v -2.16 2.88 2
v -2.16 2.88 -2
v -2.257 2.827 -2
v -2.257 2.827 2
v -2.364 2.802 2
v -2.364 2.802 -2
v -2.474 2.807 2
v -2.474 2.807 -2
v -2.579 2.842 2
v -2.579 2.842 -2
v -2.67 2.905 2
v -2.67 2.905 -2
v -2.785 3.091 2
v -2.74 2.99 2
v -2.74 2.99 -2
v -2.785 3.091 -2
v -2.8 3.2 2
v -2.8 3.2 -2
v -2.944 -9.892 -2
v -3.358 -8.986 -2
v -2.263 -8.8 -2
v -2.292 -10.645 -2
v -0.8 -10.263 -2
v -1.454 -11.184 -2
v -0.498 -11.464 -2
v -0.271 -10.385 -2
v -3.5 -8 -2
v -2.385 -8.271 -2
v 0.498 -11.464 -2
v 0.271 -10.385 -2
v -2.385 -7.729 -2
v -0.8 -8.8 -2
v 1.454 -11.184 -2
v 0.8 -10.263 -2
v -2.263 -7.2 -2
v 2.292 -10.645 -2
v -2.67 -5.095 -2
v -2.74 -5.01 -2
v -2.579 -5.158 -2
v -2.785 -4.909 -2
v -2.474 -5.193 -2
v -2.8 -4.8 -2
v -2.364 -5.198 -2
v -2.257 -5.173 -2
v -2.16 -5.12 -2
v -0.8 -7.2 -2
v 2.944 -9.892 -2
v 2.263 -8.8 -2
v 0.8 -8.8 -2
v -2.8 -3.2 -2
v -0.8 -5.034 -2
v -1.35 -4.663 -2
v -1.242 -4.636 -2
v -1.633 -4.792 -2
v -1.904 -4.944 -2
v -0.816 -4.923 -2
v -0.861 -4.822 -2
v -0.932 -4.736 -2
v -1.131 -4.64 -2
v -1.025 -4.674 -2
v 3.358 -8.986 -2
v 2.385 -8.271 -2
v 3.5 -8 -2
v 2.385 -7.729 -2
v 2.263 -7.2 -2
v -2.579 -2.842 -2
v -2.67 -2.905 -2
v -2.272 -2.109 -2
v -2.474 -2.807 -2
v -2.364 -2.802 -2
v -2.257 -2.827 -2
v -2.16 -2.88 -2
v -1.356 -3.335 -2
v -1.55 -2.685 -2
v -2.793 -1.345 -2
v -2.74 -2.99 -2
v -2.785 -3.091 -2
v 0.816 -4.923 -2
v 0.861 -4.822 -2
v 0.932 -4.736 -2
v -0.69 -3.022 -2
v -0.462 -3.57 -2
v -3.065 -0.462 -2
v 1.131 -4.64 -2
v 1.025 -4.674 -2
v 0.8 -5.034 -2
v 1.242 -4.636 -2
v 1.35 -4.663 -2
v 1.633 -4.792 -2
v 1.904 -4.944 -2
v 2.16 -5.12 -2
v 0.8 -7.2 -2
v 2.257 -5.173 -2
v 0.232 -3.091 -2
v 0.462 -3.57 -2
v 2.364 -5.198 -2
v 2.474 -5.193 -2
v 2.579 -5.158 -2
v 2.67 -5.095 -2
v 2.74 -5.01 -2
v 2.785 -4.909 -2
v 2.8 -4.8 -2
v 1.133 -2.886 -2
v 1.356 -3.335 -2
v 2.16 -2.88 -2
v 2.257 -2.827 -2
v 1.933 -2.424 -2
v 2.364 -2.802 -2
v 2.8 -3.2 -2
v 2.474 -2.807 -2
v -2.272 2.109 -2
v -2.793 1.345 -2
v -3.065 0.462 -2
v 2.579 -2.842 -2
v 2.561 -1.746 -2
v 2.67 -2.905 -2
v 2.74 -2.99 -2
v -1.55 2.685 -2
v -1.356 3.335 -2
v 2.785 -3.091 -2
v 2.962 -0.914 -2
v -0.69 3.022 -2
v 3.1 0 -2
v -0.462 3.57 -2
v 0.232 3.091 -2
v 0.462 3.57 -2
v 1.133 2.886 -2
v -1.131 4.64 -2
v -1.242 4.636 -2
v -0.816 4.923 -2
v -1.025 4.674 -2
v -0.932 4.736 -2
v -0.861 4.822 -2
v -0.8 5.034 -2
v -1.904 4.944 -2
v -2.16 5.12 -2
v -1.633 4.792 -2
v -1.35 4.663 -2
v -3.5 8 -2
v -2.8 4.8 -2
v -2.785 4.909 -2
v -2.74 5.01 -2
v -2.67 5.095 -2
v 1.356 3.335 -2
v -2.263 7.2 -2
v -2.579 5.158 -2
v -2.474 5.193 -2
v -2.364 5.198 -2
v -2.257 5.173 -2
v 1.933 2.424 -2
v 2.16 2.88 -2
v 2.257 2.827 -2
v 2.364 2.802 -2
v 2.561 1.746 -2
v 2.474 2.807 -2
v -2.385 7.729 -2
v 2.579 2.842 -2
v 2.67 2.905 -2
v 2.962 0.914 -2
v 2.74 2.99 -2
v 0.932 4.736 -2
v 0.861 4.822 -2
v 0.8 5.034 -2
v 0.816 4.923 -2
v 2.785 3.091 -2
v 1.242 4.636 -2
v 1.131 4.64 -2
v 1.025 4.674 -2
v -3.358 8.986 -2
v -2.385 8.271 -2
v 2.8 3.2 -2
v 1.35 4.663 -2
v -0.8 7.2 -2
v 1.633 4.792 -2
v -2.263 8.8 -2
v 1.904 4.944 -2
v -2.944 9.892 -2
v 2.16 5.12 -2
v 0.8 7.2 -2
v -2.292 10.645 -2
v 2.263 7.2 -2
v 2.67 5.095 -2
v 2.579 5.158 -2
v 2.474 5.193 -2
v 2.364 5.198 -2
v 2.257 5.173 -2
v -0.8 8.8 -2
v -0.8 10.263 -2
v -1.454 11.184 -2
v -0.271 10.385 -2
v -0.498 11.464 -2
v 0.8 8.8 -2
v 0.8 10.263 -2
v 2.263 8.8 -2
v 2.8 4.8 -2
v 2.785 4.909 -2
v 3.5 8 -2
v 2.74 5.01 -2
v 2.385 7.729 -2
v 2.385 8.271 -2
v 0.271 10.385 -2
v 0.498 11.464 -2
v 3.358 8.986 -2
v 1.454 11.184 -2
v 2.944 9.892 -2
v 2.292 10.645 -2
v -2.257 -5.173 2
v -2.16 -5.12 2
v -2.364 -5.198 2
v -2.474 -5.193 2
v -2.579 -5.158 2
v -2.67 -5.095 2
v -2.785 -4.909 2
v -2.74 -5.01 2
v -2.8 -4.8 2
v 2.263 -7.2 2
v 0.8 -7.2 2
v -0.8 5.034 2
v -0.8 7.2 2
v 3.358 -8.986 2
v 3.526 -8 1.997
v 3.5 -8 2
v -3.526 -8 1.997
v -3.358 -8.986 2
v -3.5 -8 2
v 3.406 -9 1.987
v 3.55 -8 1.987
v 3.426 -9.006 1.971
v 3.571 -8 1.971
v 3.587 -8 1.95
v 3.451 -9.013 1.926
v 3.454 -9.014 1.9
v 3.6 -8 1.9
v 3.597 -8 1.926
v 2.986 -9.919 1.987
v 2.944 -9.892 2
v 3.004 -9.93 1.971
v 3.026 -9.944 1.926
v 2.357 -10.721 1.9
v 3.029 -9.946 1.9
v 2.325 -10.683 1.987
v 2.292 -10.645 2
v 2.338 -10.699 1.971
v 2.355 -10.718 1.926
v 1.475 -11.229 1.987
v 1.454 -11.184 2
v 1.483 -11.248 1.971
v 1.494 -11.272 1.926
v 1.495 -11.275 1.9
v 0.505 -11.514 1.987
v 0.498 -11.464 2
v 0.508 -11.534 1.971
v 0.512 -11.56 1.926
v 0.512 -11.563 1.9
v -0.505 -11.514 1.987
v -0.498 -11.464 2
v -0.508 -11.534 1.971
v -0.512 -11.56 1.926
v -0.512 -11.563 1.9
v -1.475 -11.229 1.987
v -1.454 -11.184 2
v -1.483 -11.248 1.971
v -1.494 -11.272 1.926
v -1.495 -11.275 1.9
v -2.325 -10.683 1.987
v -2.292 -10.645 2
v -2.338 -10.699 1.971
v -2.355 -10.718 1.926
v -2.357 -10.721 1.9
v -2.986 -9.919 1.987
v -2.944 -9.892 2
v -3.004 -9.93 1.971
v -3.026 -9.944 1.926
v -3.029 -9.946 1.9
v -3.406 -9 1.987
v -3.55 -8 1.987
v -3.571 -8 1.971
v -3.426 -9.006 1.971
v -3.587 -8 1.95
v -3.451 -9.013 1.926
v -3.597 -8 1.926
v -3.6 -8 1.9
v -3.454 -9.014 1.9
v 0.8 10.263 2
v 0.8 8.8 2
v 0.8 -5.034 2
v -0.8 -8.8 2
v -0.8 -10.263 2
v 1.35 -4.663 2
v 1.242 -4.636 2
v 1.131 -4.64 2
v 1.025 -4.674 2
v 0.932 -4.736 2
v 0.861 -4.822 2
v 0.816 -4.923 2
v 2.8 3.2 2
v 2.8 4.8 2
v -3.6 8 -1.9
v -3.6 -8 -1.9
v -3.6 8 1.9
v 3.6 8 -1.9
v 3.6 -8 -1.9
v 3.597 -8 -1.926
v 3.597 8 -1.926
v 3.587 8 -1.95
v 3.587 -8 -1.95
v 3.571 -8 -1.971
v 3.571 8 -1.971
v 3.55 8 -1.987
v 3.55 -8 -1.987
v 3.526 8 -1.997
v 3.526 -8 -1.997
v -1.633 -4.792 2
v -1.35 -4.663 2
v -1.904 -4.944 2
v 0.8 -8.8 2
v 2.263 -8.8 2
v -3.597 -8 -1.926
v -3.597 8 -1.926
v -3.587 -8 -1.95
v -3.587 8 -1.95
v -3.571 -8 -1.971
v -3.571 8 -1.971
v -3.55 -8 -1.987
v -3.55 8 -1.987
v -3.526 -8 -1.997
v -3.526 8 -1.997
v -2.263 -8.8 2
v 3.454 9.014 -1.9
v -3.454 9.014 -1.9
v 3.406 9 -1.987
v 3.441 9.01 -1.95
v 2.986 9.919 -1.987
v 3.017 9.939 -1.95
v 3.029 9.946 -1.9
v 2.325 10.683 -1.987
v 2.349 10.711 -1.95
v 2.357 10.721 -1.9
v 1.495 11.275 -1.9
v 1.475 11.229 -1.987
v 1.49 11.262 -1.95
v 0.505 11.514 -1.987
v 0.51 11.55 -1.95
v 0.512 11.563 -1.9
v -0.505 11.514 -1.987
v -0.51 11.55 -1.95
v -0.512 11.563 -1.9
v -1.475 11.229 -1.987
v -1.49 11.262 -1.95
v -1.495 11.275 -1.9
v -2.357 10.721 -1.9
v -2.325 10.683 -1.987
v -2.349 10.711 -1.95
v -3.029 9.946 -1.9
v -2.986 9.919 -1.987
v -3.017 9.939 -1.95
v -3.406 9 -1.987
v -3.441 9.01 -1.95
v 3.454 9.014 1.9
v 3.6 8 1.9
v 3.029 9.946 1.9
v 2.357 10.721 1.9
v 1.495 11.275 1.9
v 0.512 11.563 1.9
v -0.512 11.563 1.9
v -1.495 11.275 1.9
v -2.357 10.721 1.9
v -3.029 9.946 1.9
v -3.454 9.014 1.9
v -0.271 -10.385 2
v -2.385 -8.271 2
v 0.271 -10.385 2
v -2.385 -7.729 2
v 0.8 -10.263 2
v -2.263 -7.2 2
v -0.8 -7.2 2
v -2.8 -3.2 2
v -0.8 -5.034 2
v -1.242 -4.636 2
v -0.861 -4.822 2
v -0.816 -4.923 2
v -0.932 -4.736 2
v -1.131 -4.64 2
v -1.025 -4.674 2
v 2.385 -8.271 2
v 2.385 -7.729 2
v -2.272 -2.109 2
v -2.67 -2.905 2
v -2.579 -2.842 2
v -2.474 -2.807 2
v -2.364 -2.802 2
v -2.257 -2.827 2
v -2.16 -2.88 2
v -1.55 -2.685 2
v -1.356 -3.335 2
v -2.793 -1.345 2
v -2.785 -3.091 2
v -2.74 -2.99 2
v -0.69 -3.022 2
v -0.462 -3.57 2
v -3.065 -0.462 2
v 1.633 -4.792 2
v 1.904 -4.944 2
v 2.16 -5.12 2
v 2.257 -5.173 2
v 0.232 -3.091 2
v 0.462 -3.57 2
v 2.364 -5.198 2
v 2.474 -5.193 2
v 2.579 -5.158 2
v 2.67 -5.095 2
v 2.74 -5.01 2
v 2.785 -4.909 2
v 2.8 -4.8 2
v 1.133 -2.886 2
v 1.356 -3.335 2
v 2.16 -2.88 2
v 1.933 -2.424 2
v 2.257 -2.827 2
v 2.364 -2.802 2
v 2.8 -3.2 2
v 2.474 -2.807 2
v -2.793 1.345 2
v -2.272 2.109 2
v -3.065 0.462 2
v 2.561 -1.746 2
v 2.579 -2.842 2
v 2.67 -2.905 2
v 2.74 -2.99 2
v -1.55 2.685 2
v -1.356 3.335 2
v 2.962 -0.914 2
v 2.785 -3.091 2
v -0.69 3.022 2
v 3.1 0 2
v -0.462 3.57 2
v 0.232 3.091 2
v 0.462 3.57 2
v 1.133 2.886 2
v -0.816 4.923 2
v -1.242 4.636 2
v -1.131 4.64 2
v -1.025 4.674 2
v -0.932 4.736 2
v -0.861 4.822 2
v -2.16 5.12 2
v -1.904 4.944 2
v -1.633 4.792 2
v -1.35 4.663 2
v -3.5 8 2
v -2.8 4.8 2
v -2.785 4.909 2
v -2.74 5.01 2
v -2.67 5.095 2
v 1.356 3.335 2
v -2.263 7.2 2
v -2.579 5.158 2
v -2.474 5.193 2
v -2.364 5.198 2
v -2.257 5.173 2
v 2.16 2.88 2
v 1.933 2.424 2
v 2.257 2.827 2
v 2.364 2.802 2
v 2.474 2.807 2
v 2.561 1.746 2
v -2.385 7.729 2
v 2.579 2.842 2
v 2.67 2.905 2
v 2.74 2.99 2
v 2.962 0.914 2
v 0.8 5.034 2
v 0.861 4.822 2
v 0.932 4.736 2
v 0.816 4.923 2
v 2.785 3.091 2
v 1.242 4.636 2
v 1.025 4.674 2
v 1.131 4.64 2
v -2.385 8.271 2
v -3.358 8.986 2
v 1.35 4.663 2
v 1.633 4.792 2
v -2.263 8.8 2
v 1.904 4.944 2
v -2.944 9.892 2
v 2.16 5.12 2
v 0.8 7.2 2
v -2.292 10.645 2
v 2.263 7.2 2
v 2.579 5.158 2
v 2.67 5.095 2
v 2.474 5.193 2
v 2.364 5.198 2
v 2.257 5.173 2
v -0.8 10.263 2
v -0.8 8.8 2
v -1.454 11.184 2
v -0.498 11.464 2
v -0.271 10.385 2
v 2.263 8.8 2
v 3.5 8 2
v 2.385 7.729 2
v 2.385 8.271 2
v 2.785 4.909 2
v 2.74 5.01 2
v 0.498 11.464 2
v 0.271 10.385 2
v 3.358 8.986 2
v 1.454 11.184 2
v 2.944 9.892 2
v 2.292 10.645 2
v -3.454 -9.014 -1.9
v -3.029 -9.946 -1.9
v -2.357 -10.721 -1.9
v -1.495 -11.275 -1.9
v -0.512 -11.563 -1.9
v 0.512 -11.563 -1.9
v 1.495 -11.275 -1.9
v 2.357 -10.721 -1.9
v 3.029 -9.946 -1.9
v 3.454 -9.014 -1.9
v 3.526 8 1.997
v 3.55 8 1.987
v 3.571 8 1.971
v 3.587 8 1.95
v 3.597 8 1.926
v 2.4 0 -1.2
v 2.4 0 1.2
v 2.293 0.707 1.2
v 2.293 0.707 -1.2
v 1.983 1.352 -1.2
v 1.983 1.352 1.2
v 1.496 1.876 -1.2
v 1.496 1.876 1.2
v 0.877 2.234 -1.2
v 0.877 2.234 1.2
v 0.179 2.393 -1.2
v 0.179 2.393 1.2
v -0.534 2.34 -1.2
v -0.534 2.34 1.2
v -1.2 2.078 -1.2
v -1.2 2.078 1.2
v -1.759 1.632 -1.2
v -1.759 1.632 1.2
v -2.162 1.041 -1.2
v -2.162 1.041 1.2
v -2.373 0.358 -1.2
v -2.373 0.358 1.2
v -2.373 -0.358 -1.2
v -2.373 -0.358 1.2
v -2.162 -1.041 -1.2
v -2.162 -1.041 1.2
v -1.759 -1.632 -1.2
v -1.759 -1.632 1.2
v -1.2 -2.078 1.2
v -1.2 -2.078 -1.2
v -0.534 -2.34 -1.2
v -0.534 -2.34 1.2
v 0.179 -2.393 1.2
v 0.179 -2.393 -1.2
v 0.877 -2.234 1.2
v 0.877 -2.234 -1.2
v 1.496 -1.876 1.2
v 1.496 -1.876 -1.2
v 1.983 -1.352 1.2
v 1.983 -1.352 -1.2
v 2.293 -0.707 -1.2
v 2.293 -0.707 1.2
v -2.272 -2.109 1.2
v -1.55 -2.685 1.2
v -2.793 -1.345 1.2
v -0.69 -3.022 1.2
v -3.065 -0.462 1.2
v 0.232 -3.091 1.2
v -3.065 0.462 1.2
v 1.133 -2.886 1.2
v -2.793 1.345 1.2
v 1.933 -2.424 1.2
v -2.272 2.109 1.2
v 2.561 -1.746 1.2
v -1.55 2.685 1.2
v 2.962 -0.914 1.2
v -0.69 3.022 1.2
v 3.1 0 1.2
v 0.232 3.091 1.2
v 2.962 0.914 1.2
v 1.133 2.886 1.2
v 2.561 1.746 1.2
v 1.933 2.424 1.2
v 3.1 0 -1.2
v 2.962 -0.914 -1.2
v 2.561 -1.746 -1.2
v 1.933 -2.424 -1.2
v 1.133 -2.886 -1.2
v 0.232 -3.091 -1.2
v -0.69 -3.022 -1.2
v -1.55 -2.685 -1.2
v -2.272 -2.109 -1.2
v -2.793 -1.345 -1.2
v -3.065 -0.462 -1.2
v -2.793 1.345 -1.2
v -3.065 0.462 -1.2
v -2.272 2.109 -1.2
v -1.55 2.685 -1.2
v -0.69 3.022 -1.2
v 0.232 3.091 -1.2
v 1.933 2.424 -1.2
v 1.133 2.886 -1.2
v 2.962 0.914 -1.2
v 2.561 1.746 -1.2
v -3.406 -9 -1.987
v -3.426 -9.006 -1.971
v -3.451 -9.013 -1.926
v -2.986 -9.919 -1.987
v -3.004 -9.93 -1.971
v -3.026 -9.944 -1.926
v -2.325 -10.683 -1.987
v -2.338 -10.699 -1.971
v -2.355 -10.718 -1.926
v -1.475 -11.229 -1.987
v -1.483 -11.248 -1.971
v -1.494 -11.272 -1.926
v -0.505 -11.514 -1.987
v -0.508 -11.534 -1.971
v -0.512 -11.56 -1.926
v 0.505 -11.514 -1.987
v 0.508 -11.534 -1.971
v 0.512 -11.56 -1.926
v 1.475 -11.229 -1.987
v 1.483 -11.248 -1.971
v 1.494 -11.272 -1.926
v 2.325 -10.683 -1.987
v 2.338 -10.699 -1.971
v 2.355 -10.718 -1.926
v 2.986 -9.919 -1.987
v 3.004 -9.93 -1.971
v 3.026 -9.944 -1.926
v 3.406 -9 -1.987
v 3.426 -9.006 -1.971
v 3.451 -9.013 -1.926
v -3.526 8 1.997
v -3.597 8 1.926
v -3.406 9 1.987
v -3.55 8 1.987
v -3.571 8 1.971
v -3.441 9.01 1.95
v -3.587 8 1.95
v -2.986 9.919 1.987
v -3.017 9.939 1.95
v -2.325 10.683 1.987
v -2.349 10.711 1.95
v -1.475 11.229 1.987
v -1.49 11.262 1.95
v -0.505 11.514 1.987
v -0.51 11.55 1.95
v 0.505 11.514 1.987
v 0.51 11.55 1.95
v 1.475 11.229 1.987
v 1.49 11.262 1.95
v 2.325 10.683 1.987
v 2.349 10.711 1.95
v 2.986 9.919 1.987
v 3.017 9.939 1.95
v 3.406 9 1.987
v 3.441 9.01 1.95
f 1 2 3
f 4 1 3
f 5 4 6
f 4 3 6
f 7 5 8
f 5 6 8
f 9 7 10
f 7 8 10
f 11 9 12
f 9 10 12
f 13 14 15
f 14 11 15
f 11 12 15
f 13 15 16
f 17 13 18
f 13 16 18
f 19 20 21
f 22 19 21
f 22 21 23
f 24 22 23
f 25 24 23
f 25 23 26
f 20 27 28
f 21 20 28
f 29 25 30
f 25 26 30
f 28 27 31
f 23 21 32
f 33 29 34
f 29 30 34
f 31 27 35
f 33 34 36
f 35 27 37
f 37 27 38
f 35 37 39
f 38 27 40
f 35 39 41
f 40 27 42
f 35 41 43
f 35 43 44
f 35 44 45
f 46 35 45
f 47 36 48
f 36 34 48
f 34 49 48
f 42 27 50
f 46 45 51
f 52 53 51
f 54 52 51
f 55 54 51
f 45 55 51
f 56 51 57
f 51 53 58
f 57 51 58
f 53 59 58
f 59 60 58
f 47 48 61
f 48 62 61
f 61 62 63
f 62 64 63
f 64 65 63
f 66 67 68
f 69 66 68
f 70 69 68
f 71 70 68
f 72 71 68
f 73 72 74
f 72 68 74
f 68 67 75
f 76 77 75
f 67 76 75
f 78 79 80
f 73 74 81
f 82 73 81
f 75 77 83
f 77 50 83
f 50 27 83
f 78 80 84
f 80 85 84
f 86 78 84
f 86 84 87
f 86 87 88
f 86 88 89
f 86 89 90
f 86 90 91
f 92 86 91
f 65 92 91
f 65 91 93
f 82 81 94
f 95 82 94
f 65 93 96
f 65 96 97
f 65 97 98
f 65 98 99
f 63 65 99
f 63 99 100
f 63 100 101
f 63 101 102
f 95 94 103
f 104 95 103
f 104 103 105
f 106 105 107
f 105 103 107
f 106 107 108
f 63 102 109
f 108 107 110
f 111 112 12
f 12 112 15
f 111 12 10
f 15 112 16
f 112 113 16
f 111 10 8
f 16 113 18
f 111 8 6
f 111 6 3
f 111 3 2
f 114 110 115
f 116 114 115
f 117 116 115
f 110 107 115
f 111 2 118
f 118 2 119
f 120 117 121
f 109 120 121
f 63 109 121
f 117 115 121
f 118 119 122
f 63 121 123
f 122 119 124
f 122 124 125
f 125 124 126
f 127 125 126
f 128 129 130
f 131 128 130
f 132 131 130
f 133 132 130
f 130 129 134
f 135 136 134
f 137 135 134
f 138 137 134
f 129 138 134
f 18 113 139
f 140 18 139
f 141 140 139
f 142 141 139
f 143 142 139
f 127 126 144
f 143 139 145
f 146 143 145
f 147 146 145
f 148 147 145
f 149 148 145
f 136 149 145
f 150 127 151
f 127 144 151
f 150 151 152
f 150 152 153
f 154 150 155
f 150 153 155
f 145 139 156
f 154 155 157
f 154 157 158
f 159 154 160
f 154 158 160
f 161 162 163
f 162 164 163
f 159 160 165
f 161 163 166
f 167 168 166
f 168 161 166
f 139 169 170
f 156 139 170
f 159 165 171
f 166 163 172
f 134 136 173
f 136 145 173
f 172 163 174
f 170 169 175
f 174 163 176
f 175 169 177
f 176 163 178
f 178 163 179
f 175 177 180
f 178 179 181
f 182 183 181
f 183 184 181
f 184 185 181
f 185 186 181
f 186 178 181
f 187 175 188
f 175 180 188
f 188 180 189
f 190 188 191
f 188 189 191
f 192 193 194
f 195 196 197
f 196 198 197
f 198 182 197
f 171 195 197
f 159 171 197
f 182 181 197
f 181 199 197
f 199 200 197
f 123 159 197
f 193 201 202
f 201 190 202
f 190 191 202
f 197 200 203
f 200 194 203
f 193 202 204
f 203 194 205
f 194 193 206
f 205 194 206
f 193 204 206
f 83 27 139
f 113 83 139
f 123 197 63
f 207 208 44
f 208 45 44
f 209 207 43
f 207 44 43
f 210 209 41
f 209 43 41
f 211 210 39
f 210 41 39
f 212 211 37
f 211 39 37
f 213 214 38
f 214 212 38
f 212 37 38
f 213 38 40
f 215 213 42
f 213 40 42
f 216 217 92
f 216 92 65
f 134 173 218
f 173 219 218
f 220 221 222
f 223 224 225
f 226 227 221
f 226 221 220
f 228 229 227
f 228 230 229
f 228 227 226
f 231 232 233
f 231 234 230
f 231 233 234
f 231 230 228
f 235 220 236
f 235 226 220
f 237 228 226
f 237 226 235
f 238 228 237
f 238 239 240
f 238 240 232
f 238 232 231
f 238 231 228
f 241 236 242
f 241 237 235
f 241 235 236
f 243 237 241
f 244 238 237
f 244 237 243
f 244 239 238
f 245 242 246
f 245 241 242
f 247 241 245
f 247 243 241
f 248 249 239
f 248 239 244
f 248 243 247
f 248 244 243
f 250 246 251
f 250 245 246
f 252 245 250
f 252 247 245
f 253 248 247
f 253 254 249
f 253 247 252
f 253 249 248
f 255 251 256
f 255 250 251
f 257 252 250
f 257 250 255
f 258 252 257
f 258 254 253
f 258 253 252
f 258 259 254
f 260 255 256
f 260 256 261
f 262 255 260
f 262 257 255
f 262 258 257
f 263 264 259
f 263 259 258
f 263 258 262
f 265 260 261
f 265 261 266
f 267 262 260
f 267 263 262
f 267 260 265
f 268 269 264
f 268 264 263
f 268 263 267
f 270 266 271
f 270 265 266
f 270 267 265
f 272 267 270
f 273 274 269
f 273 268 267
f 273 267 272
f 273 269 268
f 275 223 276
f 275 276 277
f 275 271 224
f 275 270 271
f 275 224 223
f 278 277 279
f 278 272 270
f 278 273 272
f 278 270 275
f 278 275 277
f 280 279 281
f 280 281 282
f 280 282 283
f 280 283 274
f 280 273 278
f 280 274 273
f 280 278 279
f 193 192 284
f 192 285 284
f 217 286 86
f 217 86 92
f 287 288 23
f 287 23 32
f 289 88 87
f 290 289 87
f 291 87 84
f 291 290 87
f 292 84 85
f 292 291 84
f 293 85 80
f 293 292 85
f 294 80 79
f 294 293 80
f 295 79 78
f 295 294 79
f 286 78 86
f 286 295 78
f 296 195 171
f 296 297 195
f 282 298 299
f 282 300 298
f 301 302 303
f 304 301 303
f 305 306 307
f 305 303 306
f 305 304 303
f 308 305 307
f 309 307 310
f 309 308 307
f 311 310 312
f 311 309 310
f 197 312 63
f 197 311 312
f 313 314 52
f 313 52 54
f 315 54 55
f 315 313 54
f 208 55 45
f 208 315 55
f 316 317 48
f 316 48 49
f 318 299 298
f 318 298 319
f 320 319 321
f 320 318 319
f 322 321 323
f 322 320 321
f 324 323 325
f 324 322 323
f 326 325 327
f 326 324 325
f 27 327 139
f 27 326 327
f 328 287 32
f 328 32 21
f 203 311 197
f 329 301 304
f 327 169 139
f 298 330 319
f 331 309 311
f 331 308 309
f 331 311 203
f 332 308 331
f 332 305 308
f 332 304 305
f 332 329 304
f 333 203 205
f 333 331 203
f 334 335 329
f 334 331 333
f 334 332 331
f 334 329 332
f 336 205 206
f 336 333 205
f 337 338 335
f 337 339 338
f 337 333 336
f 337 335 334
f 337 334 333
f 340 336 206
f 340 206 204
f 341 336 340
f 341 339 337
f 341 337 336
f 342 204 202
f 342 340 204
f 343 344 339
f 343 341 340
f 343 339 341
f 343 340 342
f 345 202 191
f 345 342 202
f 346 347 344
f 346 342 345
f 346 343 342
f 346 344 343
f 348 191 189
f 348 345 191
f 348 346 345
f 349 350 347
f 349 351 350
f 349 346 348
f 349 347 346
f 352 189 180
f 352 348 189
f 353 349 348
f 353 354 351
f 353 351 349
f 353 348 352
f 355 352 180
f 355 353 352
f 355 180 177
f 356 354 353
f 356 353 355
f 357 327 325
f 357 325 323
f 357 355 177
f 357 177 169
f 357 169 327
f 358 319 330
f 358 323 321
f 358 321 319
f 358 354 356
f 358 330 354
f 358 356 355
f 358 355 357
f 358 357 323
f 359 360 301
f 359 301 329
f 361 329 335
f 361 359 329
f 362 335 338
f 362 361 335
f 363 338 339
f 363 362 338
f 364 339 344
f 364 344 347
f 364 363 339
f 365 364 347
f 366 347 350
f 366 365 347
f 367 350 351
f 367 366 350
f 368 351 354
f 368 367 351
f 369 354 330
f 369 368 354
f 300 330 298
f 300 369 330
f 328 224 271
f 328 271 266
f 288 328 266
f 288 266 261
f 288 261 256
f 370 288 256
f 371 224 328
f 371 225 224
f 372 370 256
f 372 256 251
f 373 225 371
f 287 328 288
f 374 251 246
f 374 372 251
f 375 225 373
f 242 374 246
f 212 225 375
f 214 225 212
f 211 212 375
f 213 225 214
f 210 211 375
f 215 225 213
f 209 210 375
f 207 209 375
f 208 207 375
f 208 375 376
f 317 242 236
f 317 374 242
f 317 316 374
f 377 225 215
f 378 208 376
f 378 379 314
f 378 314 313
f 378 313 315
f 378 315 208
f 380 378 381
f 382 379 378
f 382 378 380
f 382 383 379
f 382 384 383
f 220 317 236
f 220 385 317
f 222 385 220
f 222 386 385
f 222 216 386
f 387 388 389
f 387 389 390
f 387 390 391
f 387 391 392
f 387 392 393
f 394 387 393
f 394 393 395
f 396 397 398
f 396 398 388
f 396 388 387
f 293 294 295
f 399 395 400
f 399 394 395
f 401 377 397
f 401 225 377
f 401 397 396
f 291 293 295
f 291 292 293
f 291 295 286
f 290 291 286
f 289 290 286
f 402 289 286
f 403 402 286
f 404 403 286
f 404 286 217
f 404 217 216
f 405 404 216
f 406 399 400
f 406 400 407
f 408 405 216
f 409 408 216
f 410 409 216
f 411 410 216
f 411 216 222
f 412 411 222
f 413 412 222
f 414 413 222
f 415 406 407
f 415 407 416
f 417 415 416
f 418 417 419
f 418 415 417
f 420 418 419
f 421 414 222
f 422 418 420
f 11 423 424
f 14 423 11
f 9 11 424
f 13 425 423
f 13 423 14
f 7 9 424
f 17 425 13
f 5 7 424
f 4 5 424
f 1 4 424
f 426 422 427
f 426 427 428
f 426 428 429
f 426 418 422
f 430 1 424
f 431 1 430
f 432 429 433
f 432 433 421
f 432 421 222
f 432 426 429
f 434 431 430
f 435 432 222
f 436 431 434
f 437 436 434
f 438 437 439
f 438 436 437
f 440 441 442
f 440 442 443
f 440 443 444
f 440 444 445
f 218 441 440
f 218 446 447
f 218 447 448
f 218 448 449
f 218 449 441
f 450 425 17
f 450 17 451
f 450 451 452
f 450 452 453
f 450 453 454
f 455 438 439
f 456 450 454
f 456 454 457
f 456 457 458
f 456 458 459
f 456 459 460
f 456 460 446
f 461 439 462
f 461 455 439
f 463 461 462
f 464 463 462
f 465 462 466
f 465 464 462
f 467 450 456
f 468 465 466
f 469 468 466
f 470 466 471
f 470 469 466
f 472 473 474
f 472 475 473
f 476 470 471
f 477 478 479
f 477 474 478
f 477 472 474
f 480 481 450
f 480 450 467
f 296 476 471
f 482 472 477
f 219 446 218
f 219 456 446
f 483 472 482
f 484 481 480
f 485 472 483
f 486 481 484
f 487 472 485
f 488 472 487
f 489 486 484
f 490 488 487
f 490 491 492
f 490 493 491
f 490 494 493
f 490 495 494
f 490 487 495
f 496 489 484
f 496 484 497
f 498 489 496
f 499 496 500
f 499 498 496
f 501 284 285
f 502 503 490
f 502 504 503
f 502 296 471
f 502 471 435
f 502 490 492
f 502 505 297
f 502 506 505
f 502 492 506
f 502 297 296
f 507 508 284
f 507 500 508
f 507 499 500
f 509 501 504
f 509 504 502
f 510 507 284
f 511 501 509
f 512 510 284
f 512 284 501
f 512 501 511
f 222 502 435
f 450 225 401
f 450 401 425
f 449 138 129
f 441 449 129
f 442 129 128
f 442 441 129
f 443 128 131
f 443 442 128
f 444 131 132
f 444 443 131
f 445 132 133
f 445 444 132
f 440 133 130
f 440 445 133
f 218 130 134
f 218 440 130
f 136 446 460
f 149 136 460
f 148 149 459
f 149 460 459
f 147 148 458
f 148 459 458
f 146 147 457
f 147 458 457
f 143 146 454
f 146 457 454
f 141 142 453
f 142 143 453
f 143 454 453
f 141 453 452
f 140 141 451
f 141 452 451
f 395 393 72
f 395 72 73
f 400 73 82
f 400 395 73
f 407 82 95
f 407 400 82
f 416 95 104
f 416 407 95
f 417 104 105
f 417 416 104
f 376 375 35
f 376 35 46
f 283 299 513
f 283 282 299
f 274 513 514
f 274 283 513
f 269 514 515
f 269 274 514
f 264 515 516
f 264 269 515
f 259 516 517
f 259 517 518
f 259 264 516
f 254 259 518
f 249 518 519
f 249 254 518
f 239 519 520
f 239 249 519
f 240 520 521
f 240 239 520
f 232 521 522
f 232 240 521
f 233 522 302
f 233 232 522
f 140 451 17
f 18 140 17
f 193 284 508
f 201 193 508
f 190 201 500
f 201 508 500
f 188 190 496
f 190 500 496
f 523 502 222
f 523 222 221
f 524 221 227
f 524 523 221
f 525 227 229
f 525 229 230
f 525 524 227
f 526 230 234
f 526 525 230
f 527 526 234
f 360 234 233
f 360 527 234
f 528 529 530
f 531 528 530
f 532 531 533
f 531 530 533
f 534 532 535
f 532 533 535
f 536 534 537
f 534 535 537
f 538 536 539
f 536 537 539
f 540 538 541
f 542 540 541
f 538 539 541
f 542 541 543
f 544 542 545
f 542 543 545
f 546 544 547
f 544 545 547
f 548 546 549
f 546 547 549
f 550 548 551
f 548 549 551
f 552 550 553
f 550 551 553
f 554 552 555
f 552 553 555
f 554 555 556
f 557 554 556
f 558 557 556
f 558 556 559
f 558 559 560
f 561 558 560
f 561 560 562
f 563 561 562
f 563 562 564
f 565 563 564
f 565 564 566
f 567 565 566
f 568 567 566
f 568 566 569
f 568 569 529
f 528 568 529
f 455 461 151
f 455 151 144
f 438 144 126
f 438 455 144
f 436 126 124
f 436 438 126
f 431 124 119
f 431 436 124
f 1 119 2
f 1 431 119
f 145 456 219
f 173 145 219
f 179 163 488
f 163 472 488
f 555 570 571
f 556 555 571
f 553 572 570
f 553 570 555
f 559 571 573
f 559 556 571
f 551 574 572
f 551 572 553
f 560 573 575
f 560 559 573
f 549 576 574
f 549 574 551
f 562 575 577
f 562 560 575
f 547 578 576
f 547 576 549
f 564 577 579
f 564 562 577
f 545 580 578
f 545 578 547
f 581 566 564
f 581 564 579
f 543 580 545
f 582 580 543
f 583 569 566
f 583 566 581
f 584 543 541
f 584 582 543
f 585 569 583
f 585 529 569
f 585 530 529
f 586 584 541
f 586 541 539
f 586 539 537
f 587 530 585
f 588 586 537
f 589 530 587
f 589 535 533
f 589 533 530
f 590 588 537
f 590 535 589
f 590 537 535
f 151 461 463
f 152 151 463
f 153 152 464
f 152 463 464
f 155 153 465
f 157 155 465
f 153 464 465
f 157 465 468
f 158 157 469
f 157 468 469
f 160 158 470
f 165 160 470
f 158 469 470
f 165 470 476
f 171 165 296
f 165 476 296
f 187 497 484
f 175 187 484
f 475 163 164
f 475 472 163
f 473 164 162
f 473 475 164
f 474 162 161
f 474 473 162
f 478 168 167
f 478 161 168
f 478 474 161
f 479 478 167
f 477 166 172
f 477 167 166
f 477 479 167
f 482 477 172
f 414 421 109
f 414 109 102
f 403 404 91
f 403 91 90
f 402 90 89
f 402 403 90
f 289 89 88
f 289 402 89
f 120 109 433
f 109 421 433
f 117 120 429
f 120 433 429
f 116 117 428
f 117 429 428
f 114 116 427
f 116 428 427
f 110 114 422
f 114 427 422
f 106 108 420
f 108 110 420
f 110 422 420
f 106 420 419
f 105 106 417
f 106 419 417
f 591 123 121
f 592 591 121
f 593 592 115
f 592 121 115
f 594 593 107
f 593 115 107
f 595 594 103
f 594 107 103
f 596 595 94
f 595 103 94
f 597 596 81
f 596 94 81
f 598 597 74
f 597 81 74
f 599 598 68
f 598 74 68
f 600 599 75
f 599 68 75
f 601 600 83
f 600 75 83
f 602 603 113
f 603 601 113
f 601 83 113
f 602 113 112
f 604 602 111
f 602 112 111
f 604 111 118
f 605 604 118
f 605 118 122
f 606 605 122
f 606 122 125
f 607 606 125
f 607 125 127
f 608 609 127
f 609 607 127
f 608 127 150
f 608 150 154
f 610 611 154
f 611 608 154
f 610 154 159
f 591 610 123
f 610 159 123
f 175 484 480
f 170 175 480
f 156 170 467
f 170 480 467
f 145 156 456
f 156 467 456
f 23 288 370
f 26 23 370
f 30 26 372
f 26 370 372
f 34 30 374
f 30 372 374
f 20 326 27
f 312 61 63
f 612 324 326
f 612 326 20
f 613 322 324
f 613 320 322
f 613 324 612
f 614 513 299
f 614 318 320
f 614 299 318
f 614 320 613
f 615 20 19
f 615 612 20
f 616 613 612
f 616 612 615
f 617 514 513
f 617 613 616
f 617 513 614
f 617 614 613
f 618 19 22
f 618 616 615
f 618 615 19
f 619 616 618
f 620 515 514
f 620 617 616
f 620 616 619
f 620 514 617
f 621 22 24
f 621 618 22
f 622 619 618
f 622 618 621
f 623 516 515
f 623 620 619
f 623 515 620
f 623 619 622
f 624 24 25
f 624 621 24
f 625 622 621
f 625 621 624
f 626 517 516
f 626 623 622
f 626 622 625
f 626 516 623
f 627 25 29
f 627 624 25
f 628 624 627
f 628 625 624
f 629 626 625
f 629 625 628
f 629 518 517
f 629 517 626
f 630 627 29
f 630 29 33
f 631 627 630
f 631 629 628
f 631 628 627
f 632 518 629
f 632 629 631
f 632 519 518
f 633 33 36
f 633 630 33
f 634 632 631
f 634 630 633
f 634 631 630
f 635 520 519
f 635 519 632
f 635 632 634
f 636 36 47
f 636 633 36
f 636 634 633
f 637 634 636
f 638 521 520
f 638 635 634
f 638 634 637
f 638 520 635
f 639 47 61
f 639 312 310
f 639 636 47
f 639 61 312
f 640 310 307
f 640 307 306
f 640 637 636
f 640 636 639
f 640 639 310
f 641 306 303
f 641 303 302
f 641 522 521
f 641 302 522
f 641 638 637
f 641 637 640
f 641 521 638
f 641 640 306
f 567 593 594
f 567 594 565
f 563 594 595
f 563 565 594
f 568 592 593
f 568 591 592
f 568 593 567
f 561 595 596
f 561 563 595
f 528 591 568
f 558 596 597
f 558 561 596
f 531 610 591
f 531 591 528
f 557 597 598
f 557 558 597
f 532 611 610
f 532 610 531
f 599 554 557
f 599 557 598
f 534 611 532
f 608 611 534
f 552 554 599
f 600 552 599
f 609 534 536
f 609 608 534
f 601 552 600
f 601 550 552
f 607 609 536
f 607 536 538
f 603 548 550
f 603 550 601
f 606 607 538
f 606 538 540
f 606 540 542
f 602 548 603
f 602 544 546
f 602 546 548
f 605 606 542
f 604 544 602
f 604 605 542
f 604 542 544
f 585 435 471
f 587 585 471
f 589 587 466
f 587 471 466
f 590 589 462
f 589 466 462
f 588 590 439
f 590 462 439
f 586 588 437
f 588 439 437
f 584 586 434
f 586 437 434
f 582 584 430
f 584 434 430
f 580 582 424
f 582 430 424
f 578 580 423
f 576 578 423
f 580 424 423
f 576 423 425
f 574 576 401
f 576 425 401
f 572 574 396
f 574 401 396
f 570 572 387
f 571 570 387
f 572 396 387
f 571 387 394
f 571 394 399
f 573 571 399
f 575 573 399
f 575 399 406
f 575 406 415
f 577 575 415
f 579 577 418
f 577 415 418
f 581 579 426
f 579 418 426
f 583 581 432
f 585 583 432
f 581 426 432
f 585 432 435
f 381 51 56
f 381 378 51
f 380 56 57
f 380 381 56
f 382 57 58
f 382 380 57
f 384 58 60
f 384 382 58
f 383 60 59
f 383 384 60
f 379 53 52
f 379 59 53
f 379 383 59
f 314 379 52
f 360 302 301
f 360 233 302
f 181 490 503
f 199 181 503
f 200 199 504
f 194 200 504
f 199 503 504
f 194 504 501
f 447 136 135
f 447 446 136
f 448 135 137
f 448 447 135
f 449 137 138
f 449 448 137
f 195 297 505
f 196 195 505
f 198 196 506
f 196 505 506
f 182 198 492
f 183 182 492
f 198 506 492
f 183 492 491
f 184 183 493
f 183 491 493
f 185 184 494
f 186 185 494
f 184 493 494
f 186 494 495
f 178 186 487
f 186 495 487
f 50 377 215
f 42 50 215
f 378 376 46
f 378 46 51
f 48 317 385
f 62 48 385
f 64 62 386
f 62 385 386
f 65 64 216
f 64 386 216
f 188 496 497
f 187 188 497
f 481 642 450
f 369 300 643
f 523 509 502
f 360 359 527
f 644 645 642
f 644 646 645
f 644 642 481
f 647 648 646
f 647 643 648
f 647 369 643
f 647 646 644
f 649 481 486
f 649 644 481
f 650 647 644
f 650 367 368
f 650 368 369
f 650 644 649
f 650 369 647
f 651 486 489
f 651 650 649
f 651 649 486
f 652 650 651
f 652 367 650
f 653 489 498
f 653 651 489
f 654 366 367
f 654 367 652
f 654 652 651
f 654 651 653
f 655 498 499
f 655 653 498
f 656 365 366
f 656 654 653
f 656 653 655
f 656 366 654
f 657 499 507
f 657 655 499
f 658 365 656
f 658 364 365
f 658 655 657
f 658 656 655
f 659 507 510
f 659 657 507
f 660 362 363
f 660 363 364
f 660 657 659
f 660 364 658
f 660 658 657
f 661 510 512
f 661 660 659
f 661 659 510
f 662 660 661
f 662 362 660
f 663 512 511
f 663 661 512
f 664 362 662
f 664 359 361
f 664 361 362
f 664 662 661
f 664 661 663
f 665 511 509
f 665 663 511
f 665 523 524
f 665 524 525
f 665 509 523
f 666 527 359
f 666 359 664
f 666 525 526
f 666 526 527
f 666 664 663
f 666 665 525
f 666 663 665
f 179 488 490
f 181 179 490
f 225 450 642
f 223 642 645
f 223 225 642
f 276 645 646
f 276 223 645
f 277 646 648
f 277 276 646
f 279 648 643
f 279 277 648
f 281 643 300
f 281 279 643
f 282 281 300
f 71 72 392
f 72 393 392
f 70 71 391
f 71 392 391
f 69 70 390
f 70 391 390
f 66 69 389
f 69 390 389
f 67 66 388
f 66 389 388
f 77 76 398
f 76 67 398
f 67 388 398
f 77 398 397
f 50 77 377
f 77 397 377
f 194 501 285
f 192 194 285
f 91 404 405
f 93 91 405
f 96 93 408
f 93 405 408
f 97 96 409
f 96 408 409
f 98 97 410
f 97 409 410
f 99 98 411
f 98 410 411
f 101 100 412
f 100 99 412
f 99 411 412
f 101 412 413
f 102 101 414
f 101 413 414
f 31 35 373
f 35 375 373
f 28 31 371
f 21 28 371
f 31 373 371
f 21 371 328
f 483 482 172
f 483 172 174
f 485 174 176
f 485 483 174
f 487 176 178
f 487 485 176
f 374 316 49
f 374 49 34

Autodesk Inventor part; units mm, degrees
ref_plane "YZ Plane" through (0, 0, 0) normal (1, 0, 0) x (0, 1, 0)
ref_plane "XZ Plane" through (0, 0, 0) normal (0, 1, 0) x (-1, 0, 0)
ref_plane "XY Plane" through (0, 0, 0) normal (0, 0, 1) x (1, 0, 0)
sketch "Sketch1" plane through (0, 0, 0) normal (0, 0, 1) x (1, 0, 0)
  line L0 (3.6, -8) -> (3.6, 8)
  line L1 (-3.6, 8) -> (-3.6, -8)
  arc A0 (3.6, 8) -> (-3.6, 8) centre (0, 8) ccw
  circle A1 centre (0, 8) radius 2.4 construction
  circle A2 centre (0, 8) radius 3.2 construction
  circle A3 centre (0, 0) radius 3.2
  circle A4 centre (0, 0) radius 2.4
  line L2 (0, 0) -> (0, 8) construction
  line L3 (-2.8, 5.7373) -> (-2.8, 2.2627)
  line L4 (2.8, 5.7373) -> (2.8, 2.2627)
  arc A5 (-2.8, 5.7373) -> (2.8, 5.7373) centre (0, 8) ccw
  arc A6 (2.8, 2.2627) -> (-2.8, 2.2627) centre (0, 0) ccw
  arc A7 (-3.6, -8) -> (3.6, -8) centre (0, -8) ccw
  circle A8 centre (0, -8) radius 3.2 construction
  circle A9 centre (0, -8) radius 2.4 construction
  line L5 (0, 0) -> (0, -8) construction
  line L6 (-2.8, -2.2627) -> (-2.8, -5.7373)
  line L7 (2.8, -2.2627) -> (2.8, -5.7373)
  arc A10 (-2.8, -2.2627) -> (2.8, -2.2627) centre (0, 0) ccw
  arc A11 (2.8, -5.7373) -> (-2.8, -5.7373) centre (0, -8) ccw
  line L8 (0.8, 4.49) -> (0.8, 7.2)
  line L9 (0.8, 7.2) -> (2.2627, 7.2)
  line L10 (2.2627, 8.8) -> (0.8, 8.8)
  line L11 (0.8, 8.8) -> (0.8, 10.2627)
  line L12 (-0.8, 10.2627) -> (-0.8, 8.8)
  line L13 (-0.8, 8.8) -> (-2.2627, 8.8)
  line L14 (-2.2627, 7.2) -> (-0.8, 7.2)
  line L15 (-0.8, 7.2) -> (-0.8, 4.49)
  arc A12 (-2.2627, 8.8) -> (-2.2627, 7.2) centre (0, 8) ccw
  arc A13 (0.8, 10.2627) -> (-0.8, 10.2627) centre (0, 8) ccw
  arc A14 (2.2627, 7.2) -> (2.2627, 8.8) centre (0, 8) ccw
  line L16 (-0.8, -10.2627) -> (-0.8, -8.8)
  line L17 (-0.8, -8.8) -> (-2.2627, -8.8)
  line L18 (-2.2627, -7.2) -> (-0.8, -7.2)
  line L19 (-0.8, -7.2) -> (-0.8, -4.49)
  line L20 (0.8, -4.49) -> (0.8, -7.2)
  line L21 (0.8, -7.2) -> (2.2627, -7.2)
  line L22 (2.2627, -8.8) -> (0.8, -8.8)
  line L23 (0.8, -8.8) -> (0.8, -10.2627)
  arc A15 (-2.2627, -7.2) -> (-2.2627, -8.8) centre (0, -8) ccw
  arc A16 (-0.8, -10.2627) -> (0.8, -10.2627) centre (0, -8) ccw
  arc A17 (2.2627, -8.8) -> (2.2627, -7.2) centre (0, -8) ccw
  dimension "d8" = 4.8
  dimension "d9" = 6.4
  dimension "d32" = 7.2
  dimension "d34" = 8
  dimension "d36" = 0.8
  dimension "d52" = 1.6
extrude "Extrusion1" add sketch "Sketch1" along normal mid plane 4 contours A7 L1 A0 L0 | A3
sketch "Sketch6" plane through (0, 0, 2) normal (0, 0, 1) x (1, 0, 0)
  circle A0 centre (0, 0) radius 3.1
  circle A1 centre (0, 0) radius 2.4 projected
  dimension "d53" = 6.2
extrude "Extrusion7" cut sketch "Sketch6" against normal blind 0.8 contours A0 | A1
mirror "Mirror1" about plane through (0, 0, 0) normal (0, 0, 1) of "Extrusion7"
fillet "Fillet1" radius 0.1 6 edges at (0, 11.6, 2) (3.6, 0, 2) (-3.6, 0, 2) (0, 11.6, -2) (-3.6, 0, -2) (3.6, 0, -2)
fillet "Fillet1" radius 0.4 12 edges at (-2.8, -2.2627, 0) (-2.8, -5.7373, 0) (2.8, -5.7373, 0) (2.8, -2.2627, 0) (-2.8, 5.7373, 0) (-2.8, 2.2627, 0) (-0.8, -4.49, 0) (0.8, -4.49, 0) (2.8, 2.2627, 0) (2.8, 5.7373, 0) (0.8, 4.49, 0) (-0.8, 4.49, 0)
equation "\"d8\" = kd"
equation "\"d9\" = tsd"
equation "\"d32\" = tlad"
equation "\"d34\" = lu"
equation "\"d52\" = axlet"
equation "\"d14\" = 0.5 * lu"
equation "\"d41\" = tsl"
equation "\"d45\" = lf"
equation "\"d46\" = tf"
equation "\"kd\" = 4.8"
equation "\"tsd\" = 6.4"
equation "\"tlad\" = 7.2"
equation "\"lu\" = 8"
equation "\"axlet\" = 1.6"
equation "\"tsl\" = 0.8"
equation "\"lf\" = 0.1"
equation "\"tf\" = 0.4"
properties part number "6632-LtBluishGray" material "ABS Plastic"
